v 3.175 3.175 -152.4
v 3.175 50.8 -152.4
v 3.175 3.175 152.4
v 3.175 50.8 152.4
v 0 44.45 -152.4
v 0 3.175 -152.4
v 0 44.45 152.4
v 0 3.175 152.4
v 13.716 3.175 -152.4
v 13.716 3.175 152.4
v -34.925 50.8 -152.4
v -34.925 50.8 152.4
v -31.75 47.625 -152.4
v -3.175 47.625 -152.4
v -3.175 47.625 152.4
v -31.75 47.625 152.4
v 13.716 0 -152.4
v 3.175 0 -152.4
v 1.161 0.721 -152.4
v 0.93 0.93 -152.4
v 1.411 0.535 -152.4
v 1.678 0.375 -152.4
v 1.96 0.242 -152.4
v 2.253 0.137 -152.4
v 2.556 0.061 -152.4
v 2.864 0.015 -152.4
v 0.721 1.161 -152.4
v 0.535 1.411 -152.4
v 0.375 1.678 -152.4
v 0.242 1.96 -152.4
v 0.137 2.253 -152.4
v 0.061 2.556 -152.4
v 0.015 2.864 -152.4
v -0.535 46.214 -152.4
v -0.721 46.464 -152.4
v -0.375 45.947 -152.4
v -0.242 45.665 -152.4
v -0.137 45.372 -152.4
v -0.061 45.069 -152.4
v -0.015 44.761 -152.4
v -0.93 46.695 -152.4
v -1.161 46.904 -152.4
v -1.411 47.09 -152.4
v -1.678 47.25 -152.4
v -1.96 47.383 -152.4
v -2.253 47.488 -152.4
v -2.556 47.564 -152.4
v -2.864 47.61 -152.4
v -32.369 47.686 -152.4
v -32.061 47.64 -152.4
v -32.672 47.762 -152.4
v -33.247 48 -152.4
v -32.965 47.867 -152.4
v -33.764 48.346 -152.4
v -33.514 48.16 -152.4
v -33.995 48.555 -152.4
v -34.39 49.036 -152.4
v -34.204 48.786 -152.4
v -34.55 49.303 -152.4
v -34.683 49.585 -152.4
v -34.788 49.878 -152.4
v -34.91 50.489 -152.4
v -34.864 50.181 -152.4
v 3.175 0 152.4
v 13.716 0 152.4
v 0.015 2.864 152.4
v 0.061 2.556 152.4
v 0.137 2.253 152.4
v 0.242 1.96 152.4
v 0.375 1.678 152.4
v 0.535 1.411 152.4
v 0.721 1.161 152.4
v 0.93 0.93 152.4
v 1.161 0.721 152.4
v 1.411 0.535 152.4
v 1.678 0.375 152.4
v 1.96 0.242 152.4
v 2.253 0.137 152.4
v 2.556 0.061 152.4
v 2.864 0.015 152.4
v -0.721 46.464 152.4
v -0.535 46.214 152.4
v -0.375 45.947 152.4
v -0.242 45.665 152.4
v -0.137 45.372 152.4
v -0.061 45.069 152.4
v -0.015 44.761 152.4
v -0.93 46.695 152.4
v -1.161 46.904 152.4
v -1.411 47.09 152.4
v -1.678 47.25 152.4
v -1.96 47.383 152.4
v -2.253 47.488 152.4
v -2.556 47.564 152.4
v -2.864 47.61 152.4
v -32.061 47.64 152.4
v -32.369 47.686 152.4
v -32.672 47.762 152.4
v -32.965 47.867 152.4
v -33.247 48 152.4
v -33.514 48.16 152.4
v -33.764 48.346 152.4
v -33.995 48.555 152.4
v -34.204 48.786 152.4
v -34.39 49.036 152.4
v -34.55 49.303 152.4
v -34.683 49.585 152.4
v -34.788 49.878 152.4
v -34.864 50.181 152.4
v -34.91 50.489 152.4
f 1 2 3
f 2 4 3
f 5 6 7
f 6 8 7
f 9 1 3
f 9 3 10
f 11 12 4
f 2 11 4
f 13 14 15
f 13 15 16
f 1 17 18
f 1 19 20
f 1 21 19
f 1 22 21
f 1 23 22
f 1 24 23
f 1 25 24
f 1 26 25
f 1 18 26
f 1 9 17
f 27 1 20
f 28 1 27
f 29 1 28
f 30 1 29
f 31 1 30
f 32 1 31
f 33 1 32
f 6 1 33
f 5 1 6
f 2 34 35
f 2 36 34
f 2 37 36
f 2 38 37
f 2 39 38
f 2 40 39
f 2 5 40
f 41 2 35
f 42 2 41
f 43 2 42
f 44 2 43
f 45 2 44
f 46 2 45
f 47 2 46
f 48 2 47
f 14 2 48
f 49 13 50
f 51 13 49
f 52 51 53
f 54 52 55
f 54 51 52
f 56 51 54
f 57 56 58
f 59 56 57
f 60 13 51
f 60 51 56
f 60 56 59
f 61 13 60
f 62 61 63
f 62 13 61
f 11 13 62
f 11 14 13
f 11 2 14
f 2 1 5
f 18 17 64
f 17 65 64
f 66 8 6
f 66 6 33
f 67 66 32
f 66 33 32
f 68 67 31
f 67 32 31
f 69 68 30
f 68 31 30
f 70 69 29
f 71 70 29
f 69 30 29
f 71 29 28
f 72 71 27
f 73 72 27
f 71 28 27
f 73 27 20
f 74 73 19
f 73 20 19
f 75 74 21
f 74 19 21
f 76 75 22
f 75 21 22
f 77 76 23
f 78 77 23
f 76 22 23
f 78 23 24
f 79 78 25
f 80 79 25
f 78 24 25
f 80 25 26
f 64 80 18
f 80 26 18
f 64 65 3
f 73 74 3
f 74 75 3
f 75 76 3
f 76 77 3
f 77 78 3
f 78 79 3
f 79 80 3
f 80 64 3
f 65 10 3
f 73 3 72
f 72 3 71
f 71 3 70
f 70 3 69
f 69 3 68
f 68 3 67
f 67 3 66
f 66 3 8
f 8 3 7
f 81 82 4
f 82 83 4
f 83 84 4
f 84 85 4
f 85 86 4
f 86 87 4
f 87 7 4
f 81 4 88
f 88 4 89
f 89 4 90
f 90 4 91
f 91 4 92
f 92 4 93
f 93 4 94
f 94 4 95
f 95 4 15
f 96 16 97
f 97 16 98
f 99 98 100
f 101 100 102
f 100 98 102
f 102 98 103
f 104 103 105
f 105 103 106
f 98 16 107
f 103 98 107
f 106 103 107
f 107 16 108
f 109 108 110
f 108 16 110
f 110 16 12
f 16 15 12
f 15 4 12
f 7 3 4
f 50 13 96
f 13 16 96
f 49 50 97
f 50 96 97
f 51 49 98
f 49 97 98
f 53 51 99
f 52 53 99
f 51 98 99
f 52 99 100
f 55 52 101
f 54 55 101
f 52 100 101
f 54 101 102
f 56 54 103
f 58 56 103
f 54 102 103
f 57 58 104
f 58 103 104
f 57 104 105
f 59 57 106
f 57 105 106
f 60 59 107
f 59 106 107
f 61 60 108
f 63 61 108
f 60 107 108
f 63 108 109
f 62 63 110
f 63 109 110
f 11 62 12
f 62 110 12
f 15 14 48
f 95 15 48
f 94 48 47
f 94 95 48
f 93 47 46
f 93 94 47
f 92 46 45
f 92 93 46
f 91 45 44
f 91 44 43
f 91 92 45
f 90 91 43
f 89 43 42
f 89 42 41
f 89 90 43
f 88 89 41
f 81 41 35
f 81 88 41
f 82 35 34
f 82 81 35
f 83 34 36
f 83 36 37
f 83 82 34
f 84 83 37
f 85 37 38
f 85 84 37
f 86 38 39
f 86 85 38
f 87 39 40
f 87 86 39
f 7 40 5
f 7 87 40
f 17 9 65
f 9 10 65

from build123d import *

# Parameters (mm, degrees)
BOSS_EXTRUDE1_DEPTH = 152.4
FILLET1_R           = 3.175


with BuildPart() as part:
    # Sketch3 → Boss-Extrude1 (new, symmetric)
    with BuildSketch(Plane.XY):
        Polygon((-34.925, 50.8), (3.175, 50.8), (3.175, 3.175), (13.716, 3.175), (13.716, 0), (0, 0), (0, 47.625), (-34.925, 47.625), align=None)
    extrude(amount=BOSS_EXTRUDE1_DEPTH, both=True)

    # Fillet1
    fillet1_edges = [part.edges().sort_by_distance(p)[0] for p in [
        (-34.925, 47.625, 0),
        (0, 47.625, 0),
        (0, 0, 0),
    ]]
    fillet(fillet1_edges, radius=FILLET1_R - 0.0001)  # a hair under: the kernel refuses the full size


solid = part.part
